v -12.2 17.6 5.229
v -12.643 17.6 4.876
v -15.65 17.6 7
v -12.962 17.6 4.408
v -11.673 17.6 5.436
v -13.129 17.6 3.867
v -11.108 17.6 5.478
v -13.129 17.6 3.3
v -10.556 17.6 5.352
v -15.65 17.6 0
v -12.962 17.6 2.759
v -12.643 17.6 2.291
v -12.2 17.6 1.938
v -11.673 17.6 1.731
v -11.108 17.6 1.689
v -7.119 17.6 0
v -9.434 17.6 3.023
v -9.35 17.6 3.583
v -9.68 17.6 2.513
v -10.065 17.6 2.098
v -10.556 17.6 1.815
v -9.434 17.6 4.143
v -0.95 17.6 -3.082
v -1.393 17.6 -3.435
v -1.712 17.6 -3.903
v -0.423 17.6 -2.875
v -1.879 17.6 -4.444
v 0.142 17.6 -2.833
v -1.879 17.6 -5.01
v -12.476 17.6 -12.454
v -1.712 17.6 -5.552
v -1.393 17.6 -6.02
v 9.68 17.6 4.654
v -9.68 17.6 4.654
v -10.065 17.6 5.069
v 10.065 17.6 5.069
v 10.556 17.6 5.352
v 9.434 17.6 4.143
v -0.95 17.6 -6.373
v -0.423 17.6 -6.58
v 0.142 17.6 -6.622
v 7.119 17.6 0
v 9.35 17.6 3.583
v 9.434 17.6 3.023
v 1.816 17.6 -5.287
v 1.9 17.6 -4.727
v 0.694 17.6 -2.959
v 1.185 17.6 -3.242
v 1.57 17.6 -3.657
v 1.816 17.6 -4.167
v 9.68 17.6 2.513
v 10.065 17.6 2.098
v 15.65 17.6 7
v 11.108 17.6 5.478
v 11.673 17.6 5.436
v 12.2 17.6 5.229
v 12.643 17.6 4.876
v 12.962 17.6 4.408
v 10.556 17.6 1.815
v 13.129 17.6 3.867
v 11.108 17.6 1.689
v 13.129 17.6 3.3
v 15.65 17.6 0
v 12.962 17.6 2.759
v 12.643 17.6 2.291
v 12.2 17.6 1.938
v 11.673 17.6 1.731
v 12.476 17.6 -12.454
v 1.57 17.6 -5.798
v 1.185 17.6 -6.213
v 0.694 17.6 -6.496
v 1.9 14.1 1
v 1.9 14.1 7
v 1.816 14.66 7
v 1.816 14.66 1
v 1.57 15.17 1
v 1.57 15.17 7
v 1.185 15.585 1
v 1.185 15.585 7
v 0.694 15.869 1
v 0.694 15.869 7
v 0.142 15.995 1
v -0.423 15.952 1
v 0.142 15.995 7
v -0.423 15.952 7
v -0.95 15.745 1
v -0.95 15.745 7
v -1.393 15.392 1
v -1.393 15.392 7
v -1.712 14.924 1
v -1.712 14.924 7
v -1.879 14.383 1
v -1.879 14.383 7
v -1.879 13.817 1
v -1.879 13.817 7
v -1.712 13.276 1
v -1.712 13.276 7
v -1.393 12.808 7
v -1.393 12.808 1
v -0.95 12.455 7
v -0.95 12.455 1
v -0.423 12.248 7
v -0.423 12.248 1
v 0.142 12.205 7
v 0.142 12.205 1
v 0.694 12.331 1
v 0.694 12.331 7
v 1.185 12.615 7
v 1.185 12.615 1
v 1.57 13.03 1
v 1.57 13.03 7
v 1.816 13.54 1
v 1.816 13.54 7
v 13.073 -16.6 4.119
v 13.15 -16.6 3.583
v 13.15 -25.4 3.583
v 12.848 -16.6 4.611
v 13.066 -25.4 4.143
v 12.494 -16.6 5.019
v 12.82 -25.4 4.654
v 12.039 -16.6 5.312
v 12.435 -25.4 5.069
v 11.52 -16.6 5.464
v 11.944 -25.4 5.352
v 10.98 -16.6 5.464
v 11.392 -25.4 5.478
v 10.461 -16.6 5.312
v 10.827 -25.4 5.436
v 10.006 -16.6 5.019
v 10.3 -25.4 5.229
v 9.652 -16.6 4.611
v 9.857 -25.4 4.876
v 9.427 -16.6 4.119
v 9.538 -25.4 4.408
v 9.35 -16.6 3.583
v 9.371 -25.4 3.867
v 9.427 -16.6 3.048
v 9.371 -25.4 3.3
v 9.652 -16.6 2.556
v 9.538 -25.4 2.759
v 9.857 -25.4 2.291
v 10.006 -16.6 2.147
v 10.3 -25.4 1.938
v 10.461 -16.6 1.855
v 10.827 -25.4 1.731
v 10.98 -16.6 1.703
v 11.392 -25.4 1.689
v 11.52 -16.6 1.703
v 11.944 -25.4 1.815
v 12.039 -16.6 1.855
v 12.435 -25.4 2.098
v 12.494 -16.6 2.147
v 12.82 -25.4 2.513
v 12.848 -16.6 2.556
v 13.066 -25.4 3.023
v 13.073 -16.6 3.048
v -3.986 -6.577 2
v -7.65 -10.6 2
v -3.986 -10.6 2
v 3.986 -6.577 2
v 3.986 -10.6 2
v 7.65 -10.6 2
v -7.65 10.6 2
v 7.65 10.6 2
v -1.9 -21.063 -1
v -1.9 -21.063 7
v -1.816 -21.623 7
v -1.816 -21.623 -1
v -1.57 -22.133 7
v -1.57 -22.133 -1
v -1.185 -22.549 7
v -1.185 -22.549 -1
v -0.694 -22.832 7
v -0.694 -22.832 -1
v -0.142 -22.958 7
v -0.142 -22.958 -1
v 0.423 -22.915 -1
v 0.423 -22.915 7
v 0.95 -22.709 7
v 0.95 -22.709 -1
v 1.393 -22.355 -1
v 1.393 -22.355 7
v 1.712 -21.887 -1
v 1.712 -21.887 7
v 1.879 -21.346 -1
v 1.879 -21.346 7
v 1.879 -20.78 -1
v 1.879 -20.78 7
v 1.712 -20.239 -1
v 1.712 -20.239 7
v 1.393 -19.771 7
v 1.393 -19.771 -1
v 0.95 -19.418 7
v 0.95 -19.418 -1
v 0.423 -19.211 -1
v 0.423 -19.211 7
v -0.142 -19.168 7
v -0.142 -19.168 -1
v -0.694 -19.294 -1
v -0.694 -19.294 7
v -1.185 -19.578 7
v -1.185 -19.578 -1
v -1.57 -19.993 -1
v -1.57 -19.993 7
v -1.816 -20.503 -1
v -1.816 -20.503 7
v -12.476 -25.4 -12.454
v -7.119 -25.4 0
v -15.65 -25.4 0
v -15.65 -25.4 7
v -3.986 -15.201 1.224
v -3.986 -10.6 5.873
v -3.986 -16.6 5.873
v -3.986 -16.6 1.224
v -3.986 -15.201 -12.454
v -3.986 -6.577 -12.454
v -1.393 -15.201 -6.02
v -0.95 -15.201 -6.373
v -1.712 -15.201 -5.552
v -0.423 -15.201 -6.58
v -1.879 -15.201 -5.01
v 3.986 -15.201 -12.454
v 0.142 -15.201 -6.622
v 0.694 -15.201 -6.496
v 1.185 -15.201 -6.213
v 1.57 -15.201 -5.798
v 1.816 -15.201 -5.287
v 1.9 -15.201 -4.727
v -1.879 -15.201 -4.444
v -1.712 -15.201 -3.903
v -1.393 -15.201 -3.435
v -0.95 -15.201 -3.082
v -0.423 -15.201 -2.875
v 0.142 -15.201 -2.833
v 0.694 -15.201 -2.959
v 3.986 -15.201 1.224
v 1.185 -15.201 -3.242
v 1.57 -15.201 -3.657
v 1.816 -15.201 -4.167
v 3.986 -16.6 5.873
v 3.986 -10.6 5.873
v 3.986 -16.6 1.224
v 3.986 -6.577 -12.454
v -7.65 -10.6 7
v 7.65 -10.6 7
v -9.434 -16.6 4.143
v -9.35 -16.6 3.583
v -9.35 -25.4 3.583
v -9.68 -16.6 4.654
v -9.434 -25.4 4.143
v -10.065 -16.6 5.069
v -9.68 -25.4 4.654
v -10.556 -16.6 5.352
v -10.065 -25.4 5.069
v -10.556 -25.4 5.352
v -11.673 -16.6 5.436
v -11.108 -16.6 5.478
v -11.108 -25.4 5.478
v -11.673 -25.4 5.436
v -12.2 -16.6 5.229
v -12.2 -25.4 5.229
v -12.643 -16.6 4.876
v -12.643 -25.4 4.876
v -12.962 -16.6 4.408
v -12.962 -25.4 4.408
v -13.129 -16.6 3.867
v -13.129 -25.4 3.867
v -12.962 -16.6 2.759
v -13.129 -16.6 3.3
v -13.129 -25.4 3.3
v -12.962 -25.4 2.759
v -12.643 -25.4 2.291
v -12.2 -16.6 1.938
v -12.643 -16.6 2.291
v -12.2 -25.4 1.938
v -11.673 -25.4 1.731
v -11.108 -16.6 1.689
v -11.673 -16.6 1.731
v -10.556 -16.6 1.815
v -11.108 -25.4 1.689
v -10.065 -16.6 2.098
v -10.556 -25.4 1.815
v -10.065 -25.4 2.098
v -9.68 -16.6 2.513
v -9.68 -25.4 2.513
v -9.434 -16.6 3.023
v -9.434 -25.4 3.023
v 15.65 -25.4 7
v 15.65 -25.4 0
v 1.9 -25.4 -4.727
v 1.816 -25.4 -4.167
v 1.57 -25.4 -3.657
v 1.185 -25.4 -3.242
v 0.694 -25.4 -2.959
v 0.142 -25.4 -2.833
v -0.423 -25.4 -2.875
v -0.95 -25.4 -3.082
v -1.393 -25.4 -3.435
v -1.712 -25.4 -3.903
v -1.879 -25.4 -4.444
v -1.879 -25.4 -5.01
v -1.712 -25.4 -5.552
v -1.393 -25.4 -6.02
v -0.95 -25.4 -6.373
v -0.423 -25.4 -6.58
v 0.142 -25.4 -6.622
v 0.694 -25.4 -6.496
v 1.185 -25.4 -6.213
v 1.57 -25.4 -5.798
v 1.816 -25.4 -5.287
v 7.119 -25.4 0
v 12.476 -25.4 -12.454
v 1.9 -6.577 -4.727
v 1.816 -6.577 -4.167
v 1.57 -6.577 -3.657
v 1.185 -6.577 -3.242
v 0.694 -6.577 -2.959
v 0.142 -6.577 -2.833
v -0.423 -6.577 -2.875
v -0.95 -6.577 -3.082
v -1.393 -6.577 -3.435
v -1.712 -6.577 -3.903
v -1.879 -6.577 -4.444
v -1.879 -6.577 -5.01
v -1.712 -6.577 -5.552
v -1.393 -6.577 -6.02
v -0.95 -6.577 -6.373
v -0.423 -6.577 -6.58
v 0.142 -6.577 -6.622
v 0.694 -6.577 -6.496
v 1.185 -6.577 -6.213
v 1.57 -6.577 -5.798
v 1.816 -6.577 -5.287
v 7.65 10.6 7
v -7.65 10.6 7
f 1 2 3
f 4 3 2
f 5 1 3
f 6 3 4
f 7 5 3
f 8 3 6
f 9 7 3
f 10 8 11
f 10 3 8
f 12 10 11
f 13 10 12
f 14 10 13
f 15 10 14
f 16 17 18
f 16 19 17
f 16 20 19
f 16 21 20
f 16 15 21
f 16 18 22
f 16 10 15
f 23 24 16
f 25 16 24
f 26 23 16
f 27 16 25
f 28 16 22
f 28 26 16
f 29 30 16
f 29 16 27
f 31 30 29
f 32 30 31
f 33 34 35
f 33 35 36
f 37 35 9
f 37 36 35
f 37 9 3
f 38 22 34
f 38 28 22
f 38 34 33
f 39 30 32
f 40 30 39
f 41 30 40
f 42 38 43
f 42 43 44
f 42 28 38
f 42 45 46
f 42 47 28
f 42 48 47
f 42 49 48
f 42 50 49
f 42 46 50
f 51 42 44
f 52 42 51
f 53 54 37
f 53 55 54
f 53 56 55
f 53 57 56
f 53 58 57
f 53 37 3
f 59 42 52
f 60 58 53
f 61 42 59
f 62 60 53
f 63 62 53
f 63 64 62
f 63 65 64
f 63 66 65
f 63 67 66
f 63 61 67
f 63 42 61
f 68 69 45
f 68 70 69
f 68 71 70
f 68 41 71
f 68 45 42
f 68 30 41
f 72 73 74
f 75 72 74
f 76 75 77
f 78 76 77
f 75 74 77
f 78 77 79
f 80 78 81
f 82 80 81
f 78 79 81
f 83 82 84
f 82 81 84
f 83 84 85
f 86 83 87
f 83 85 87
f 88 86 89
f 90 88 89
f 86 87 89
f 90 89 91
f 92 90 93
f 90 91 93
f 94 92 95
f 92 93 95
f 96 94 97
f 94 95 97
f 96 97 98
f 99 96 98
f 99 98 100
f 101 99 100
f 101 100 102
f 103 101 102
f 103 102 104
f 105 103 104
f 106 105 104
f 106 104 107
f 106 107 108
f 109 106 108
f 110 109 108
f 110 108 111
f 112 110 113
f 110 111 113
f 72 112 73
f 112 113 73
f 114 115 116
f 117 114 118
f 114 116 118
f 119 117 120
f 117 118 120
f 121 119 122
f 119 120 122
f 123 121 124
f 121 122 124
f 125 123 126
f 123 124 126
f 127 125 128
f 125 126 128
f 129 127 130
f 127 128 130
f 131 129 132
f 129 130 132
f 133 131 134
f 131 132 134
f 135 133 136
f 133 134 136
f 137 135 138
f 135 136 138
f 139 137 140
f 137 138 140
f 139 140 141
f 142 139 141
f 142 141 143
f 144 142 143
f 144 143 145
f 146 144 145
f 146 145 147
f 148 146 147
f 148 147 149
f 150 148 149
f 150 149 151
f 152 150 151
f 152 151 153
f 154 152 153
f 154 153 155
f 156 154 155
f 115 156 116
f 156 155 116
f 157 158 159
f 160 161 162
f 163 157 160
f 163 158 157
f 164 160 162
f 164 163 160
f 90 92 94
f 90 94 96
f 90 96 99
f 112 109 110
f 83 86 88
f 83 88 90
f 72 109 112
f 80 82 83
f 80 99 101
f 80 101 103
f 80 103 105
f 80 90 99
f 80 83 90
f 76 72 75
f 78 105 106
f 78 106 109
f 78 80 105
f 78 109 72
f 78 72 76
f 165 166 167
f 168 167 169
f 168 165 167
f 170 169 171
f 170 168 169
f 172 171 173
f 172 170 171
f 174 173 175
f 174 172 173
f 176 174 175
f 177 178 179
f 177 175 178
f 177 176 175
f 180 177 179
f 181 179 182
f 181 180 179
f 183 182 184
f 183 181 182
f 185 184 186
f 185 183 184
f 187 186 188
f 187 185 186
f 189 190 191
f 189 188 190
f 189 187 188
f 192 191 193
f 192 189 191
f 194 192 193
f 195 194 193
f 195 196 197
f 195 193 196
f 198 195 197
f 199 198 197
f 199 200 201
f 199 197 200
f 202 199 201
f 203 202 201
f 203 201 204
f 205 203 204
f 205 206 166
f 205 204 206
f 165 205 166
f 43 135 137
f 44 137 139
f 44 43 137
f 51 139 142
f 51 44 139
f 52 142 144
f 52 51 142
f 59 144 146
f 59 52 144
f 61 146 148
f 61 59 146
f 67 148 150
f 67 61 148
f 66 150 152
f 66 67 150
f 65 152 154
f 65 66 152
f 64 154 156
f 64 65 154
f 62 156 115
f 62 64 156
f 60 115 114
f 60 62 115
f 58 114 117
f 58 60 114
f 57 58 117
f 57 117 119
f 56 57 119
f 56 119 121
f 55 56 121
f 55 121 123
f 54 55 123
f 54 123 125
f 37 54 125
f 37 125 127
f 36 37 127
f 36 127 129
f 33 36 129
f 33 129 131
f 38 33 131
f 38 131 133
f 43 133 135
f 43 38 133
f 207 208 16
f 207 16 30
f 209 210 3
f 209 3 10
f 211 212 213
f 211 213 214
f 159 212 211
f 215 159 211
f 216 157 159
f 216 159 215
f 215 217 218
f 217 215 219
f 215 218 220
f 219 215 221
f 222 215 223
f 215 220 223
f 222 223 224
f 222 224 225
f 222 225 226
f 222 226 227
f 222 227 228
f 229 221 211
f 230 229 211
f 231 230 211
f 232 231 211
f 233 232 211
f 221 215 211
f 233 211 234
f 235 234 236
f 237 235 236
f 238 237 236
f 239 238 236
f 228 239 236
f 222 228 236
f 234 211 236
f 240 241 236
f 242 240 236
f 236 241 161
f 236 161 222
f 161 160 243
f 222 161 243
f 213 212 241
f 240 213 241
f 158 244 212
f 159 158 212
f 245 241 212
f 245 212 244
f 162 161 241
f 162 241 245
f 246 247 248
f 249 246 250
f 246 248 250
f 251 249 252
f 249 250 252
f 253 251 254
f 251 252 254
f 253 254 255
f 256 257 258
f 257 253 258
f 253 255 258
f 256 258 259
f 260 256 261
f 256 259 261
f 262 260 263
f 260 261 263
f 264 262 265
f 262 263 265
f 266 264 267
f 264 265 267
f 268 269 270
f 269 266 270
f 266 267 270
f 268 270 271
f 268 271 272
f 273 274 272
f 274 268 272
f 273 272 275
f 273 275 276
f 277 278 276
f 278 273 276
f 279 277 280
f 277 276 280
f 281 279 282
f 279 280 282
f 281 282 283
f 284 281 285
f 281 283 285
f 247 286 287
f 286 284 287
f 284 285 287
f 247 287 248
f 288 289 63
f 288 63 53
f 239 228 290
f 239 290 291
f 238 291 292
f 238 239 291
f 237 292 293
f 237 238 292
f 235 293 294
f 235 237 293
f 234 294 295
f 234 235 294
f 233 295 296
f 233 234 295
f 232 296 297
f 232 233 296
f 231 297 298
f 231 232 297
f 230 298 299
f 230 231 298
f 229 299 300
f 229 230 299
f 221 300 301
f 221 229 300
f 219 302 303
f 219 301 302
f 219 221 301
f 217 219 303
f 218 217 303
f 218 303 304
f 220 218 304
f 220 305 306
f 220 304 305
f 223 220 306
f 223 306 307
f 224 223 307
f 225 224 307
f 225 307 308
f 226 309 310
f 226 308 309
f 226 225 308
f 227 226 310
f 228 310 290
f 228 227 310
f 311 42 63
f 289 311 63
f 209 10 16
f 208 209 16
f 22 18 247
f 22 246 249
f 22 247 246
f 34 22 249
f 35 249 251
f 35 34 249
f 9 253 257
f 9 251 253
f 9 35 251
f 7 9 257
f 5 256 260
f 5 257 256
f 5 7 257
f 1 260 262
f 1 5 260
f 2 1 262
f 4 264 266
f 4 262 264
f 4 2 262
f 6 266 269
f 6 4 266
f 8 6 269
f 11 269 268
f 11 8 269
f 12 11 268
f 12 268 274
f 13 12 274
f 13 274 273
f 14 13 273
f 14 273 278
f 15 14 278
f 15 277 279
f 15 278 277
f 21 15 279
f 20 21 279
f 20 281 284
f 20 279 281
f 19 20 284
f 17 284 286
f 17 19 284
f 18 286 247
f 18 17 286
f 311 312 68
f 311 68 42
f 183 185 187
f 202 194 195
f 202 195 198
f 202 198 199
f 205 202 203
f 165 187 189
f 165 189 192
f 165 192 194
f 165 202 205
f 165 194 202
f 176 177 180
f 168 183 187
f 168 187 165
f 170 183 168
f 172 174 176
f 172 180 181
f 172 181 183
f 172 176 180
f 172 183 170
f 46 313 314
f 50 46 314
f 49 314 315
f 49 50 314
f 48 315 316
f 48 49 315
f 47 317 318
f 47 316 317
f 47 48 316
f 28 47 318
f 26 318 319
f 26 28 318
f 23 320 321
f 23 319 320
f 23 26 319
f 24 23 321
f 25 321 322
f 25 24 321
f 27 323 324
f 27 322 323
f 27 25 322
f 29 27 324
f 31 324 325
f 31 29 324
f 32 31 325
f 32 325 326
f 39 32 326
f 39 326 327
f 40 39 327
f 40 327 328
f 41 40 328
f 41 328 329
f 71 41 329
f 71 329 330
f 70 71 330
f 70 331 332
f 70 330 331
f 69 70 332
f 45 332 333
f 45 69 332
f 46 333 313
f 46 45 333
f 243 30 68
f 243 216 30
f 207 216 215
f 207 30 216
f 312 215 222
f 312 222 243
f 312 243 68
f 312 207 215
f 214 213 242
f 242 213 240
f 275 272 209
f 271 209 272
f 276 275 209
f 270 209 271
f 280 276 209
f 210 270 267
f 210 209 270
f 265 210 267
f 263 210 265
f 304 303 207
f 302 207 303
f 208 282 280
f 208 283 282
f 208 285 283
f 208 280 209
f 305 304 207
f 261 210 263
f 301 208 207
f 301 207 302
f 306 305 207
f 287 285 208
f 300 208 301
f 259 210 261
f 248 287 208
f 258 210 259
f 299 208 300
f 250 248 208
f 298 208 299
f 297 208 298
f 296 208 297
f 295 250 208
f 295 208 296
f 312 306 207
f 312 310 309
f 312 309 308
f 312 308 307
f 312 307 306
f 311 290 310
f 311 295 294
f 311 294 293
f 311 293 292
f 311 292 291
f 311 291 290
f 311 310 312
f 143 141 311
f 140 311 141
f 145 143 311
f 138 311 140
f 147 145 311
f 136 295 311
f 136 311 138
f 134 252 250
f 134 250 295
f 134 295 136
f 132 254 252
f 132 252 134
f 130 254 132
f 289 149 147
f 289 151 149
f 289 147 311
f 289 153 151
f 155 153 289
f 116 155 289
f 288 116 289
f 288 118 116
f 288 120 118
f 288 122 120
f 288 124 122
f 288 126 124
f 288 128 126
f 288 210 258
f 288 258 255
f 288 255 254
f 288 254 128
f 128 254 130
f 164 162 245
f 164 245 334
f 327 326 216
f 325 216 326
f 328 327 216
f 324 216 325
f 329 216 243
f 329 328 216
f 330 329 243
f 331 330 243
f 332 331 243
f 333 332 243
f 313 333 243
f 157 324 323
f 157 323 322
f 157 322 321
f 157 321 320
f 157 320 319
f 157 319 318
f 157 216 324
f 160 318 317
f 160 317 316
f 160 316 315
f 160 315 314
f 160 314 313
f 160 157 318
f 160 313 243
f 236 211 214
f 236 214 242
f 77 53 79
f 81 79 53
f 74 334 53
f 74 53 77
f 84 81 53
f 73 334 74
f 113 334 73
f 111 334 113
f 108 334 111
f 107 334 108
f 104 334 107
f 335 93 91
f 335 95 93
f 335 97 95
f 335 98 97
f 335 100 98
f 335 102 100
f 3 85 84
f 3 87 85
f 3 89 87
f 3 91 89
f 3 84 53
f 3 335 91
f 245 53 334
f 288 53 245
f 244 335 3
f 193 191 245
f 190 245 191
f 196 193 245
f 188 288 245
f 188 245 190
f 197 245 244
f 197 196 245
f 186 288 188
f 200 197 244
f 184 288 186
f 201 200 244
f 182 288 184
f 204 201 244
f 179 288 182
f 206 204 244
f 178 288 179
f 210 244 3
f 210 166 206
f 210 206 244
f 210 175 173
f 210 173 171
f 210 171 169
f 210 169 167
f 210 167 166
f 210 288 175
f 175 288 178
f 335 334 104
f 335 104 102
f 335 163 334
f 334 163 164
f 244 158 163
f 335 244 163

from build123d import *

# Parameters (mm, degrees)
SKETCH_2_W               = 31.3
SKETCH_2_H               = 34.2
SKETCH_2_W_2             = 15.3
SKETCH_2_H_2             = 21.2
EXTRUDE_1_DEPTH          = 7
SKETCH_2_3_W             = 15.3
SKETCH_2_3_H             = 21.2
EXTRUDE_2_DEPTH          = 2
SKETCH_5_W               = 7.971023584
SKETCH_5_H               = 4.648657004
CUT_EXTRUDE_2_DEPTH      = 7
CUT_EXTRUDE_3_DEPTH      = 39.256535389
CUT_EXTRUDE_3_DEPTH_BACK = 39.256535389
SKETCH_6_R               = 1.9
EXTRUDE_3_DEPTH          = 34.2
SKETCH_8_R               = 1.9
CUT_EXTRUDE_4_DEPTH      = 6
SKETCH_9_W               = 7.971023584
SKETCH_9_H               = 8.623939395
CUT_EXTRUDE_5_DEPTH      = 28.63322883
EXTRUDE_START            = 8.8
SKETCH_10_R              = 1.9
EXTRUDE_4_DEPTH          = 8.8
CUT_EXTRUDE_6_DEPTH      = 36.616478053
CUT_EXTRUDE_6_DEPTH_BACK = 8
SKETCH_11_R              = 1.9
CUT_EXTRUDE_7_DEPTH      = 48.423834368
CUT_EXTRUDE_7_DEPTH_BACK = 48.423834368
SKETCH_12_R              = 1.9


with BuildPart() as part:
    # 草图2 → 凸台-拉伸1 (new body)
    with BuildSketch(Plane.XY):
        with Locations((0, 0.5)):
            Rectangle(SKETCH_2_W, SKETCH_2_H)
        Rectangle(SKETCH_2_W_2, SKETCH_2_H_2, mode=Mode.SUBTRACT)
    extrude(amount=EXTRUDE_1_DEPTH)

    # 草图2<3> → 凸台-拉伸2 (add)
    with BuildSketch(Plane.XY):
        Rectangle(SKETCH_2_3_W, SKETCH_2_3_H)
    extrude(amount=EXTRUDE_2_DEPTH)

    # 草图5 → 切除-拉伸2 (cut)
    with BuildSketch(Plane(origin=(0, -10.6, 0), x_dir=(1, 0, 0), z_dir=(0, 1, 0))):
        with Locations((0, -3.548249301)):
            Rectangle(SKETCH_5_W, SKETCH_5_H)
    extrude(amount=-CUT_EXTRUDE_2_DEPTH, mode=Mode.SUBTRACT)

    # 草图6 → 切除-拉伸3 (cut, two sides: drawn at the far end of the back side and taken through both)
    with BuildSketch(Plane.XZ.offset(16.6).offset(-CUT_EXTRUDE_3_DEPTH_BACK)):
        with Locations((-11.25, 3.583357856)):
            Circle(SKETCH_6_R)
        with Locations(Location((11.25, 3.583357856, 0), (0, 0, 180))):
            Circle(SKETCH_6_R)
    extrude(amount=CUT_EXTRUDE_3_DEPTH + CUT_EXTRUDE_3_DEPTH_BACK, mode=Mode.SUBTRACT)

    # 草图7 → 凸台-拉伸3 (add)
    with BuildSketch(Plane.XZ.offset(16.6)):
        Polygon((7.118714005, 0), (-7.118714005, 0), (-12.476482967, -12.453817335), (12.476482967, -12.453817335), align=None)
    extrude(amount=-EXTRUDE_3_DEPTH)

    # 草图8 → 切除-拉伸4 (cut)
    with BuildSketch(Plane.XY.offset(7)):
        with Locations((0, 14.1)):
            Circle(SKETCH_8_R)
    extrude(amount=-CUT_EXTRUDE_4_DEPTH, mode=Mode.SUBTRACT)

    # 草图9 → 切除-拉伸5 (cut, through all)
    with BuildSketch(Plane.XY.offset(2)):
        with Locations((0, -10.888708642)):
            Rectangle(SKETCH_9_W, SKETCH_9_H)
    extrude(amount=-CUT_EXTRUDE_5_DEPTH, mode=Mode.SUBTRACT)

    # 草图10 → 凸台-拉伸4 (add)
    with BuildSketch(Plane.XZ.offset(16.6).offset(EXTRUDE_START)):
        Polygon((-15.65, 7), (-15.65, 0), (-7.118714005, 0), (-12.476482967, -12.453817335), (12.476482967, -12.453817335), (7.118714005, 0), (15.65, 0), (15.65, 7), align=None)
        with Locations((-11.25, 3.583357856)):
            Circle(SKETCH_10_R, mode=Mode.SUBTRACT)
        with Locations((11.25, 3.583357856)):
            Circle(SKETCH_10_R, mode=Mode.SUBTRACT)
    extrude(amount=-EXTRUDE_4_DEPTH)

    # 草图11 → 切除-拉伸6 (cut, two sides: drawn at the far end of the back side and taken through both)
    with BuildSketch(Plane.XY.offset(7).offset(-CUT_EXTRUDE_6_DEPTH_BACK)):
        with Locations(Location((0, -21.063101394, 0), (0, 0, 180))):
            Circle(SKETCH_11_R)
    extrude(amount=CUT_EXTRUDE_6_DEPTH + CUT_EXTRUDE_6_DEPTH_BACK, mode=Mode.SUBTRACT)

    # 草图12 → 切除-拉伸7 (cut, two sides: drawn at the far end of the back side and taken through both)
    with BuildSketch(Plane.XZ.offset(25.4).offset(-CUT_EXTRUDE_7_DEPTH_BACK)):
        with Locations((0, -4.727248667)):
            Circle(SKETCH_12_R)
    extrude(amount=CUT_EXTRUDE_7_DEPTH + CUT_EXTRUDE_7_DEPTH_BACK, mode=Mode.SUBTRACT)


solid = part.part
